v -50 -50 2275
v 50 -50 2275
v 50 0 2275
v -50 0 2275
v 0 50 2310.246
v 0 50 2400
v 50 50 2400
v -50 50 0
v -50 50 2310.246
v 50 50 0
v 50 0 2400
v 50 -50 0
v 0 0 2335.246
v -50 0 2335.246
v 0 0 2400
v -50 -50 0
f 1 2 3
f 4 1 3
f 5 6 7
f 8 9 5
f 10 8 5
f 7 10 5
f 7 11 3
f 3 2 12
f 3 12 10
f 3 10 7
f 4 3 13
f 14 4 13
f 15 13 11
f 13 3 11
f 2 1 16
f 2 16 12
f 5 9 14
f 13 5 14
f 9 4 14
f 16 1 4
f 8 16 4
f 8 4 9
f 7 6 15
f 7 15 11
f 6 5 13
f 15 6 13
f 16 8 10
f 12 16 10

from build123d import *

# Parameters (mm, degrees)
F0_W          = 100
F0_H          = 100
F1_DEPTH      = 2400
F2_W          = 50
F2_H          = 125
F3_DEPTH      = 50
F3_DEPTH_BACK = 50
F5_DEPTH      = 50


with BuildPart() as f1:
    # F0 (on Top) → F1 (new body)
    with BuildSketch(Plane.XY):
        Rectangle(F0_W, F0_H)
    extrude(amount=F1_DEPTH)

    # F2 (on Right) → F3 (cut, two sides)
    with BuildSketch(Plane.YZ) as f3_sk:
        with Locations((-25, 2337.5)):
            Rectangle(F2_W, F2_H)
    extrude(amount=-F3_DEPTH, mode=Mode.SUBTRACT)
    extrude(f3_sk.sketch, amount=F3_DEPTH_BACK, mode=Mode.SUBTRACT)

    # F4 (on face) → F5 (cut)
    with BuildSketch(Plane(origin=(-50, 0, 0), x_dir=(0, -1, 0), z_dir=(-1, 0, 0))):
        Polygon((0, 2400), (-50, 2400), (-50, 2310.246), (0, 2335.246), align=None)
    extrude(amount=-F5_DEPTH, mode=Mode.SUBTRACT)


solid = f1.part
